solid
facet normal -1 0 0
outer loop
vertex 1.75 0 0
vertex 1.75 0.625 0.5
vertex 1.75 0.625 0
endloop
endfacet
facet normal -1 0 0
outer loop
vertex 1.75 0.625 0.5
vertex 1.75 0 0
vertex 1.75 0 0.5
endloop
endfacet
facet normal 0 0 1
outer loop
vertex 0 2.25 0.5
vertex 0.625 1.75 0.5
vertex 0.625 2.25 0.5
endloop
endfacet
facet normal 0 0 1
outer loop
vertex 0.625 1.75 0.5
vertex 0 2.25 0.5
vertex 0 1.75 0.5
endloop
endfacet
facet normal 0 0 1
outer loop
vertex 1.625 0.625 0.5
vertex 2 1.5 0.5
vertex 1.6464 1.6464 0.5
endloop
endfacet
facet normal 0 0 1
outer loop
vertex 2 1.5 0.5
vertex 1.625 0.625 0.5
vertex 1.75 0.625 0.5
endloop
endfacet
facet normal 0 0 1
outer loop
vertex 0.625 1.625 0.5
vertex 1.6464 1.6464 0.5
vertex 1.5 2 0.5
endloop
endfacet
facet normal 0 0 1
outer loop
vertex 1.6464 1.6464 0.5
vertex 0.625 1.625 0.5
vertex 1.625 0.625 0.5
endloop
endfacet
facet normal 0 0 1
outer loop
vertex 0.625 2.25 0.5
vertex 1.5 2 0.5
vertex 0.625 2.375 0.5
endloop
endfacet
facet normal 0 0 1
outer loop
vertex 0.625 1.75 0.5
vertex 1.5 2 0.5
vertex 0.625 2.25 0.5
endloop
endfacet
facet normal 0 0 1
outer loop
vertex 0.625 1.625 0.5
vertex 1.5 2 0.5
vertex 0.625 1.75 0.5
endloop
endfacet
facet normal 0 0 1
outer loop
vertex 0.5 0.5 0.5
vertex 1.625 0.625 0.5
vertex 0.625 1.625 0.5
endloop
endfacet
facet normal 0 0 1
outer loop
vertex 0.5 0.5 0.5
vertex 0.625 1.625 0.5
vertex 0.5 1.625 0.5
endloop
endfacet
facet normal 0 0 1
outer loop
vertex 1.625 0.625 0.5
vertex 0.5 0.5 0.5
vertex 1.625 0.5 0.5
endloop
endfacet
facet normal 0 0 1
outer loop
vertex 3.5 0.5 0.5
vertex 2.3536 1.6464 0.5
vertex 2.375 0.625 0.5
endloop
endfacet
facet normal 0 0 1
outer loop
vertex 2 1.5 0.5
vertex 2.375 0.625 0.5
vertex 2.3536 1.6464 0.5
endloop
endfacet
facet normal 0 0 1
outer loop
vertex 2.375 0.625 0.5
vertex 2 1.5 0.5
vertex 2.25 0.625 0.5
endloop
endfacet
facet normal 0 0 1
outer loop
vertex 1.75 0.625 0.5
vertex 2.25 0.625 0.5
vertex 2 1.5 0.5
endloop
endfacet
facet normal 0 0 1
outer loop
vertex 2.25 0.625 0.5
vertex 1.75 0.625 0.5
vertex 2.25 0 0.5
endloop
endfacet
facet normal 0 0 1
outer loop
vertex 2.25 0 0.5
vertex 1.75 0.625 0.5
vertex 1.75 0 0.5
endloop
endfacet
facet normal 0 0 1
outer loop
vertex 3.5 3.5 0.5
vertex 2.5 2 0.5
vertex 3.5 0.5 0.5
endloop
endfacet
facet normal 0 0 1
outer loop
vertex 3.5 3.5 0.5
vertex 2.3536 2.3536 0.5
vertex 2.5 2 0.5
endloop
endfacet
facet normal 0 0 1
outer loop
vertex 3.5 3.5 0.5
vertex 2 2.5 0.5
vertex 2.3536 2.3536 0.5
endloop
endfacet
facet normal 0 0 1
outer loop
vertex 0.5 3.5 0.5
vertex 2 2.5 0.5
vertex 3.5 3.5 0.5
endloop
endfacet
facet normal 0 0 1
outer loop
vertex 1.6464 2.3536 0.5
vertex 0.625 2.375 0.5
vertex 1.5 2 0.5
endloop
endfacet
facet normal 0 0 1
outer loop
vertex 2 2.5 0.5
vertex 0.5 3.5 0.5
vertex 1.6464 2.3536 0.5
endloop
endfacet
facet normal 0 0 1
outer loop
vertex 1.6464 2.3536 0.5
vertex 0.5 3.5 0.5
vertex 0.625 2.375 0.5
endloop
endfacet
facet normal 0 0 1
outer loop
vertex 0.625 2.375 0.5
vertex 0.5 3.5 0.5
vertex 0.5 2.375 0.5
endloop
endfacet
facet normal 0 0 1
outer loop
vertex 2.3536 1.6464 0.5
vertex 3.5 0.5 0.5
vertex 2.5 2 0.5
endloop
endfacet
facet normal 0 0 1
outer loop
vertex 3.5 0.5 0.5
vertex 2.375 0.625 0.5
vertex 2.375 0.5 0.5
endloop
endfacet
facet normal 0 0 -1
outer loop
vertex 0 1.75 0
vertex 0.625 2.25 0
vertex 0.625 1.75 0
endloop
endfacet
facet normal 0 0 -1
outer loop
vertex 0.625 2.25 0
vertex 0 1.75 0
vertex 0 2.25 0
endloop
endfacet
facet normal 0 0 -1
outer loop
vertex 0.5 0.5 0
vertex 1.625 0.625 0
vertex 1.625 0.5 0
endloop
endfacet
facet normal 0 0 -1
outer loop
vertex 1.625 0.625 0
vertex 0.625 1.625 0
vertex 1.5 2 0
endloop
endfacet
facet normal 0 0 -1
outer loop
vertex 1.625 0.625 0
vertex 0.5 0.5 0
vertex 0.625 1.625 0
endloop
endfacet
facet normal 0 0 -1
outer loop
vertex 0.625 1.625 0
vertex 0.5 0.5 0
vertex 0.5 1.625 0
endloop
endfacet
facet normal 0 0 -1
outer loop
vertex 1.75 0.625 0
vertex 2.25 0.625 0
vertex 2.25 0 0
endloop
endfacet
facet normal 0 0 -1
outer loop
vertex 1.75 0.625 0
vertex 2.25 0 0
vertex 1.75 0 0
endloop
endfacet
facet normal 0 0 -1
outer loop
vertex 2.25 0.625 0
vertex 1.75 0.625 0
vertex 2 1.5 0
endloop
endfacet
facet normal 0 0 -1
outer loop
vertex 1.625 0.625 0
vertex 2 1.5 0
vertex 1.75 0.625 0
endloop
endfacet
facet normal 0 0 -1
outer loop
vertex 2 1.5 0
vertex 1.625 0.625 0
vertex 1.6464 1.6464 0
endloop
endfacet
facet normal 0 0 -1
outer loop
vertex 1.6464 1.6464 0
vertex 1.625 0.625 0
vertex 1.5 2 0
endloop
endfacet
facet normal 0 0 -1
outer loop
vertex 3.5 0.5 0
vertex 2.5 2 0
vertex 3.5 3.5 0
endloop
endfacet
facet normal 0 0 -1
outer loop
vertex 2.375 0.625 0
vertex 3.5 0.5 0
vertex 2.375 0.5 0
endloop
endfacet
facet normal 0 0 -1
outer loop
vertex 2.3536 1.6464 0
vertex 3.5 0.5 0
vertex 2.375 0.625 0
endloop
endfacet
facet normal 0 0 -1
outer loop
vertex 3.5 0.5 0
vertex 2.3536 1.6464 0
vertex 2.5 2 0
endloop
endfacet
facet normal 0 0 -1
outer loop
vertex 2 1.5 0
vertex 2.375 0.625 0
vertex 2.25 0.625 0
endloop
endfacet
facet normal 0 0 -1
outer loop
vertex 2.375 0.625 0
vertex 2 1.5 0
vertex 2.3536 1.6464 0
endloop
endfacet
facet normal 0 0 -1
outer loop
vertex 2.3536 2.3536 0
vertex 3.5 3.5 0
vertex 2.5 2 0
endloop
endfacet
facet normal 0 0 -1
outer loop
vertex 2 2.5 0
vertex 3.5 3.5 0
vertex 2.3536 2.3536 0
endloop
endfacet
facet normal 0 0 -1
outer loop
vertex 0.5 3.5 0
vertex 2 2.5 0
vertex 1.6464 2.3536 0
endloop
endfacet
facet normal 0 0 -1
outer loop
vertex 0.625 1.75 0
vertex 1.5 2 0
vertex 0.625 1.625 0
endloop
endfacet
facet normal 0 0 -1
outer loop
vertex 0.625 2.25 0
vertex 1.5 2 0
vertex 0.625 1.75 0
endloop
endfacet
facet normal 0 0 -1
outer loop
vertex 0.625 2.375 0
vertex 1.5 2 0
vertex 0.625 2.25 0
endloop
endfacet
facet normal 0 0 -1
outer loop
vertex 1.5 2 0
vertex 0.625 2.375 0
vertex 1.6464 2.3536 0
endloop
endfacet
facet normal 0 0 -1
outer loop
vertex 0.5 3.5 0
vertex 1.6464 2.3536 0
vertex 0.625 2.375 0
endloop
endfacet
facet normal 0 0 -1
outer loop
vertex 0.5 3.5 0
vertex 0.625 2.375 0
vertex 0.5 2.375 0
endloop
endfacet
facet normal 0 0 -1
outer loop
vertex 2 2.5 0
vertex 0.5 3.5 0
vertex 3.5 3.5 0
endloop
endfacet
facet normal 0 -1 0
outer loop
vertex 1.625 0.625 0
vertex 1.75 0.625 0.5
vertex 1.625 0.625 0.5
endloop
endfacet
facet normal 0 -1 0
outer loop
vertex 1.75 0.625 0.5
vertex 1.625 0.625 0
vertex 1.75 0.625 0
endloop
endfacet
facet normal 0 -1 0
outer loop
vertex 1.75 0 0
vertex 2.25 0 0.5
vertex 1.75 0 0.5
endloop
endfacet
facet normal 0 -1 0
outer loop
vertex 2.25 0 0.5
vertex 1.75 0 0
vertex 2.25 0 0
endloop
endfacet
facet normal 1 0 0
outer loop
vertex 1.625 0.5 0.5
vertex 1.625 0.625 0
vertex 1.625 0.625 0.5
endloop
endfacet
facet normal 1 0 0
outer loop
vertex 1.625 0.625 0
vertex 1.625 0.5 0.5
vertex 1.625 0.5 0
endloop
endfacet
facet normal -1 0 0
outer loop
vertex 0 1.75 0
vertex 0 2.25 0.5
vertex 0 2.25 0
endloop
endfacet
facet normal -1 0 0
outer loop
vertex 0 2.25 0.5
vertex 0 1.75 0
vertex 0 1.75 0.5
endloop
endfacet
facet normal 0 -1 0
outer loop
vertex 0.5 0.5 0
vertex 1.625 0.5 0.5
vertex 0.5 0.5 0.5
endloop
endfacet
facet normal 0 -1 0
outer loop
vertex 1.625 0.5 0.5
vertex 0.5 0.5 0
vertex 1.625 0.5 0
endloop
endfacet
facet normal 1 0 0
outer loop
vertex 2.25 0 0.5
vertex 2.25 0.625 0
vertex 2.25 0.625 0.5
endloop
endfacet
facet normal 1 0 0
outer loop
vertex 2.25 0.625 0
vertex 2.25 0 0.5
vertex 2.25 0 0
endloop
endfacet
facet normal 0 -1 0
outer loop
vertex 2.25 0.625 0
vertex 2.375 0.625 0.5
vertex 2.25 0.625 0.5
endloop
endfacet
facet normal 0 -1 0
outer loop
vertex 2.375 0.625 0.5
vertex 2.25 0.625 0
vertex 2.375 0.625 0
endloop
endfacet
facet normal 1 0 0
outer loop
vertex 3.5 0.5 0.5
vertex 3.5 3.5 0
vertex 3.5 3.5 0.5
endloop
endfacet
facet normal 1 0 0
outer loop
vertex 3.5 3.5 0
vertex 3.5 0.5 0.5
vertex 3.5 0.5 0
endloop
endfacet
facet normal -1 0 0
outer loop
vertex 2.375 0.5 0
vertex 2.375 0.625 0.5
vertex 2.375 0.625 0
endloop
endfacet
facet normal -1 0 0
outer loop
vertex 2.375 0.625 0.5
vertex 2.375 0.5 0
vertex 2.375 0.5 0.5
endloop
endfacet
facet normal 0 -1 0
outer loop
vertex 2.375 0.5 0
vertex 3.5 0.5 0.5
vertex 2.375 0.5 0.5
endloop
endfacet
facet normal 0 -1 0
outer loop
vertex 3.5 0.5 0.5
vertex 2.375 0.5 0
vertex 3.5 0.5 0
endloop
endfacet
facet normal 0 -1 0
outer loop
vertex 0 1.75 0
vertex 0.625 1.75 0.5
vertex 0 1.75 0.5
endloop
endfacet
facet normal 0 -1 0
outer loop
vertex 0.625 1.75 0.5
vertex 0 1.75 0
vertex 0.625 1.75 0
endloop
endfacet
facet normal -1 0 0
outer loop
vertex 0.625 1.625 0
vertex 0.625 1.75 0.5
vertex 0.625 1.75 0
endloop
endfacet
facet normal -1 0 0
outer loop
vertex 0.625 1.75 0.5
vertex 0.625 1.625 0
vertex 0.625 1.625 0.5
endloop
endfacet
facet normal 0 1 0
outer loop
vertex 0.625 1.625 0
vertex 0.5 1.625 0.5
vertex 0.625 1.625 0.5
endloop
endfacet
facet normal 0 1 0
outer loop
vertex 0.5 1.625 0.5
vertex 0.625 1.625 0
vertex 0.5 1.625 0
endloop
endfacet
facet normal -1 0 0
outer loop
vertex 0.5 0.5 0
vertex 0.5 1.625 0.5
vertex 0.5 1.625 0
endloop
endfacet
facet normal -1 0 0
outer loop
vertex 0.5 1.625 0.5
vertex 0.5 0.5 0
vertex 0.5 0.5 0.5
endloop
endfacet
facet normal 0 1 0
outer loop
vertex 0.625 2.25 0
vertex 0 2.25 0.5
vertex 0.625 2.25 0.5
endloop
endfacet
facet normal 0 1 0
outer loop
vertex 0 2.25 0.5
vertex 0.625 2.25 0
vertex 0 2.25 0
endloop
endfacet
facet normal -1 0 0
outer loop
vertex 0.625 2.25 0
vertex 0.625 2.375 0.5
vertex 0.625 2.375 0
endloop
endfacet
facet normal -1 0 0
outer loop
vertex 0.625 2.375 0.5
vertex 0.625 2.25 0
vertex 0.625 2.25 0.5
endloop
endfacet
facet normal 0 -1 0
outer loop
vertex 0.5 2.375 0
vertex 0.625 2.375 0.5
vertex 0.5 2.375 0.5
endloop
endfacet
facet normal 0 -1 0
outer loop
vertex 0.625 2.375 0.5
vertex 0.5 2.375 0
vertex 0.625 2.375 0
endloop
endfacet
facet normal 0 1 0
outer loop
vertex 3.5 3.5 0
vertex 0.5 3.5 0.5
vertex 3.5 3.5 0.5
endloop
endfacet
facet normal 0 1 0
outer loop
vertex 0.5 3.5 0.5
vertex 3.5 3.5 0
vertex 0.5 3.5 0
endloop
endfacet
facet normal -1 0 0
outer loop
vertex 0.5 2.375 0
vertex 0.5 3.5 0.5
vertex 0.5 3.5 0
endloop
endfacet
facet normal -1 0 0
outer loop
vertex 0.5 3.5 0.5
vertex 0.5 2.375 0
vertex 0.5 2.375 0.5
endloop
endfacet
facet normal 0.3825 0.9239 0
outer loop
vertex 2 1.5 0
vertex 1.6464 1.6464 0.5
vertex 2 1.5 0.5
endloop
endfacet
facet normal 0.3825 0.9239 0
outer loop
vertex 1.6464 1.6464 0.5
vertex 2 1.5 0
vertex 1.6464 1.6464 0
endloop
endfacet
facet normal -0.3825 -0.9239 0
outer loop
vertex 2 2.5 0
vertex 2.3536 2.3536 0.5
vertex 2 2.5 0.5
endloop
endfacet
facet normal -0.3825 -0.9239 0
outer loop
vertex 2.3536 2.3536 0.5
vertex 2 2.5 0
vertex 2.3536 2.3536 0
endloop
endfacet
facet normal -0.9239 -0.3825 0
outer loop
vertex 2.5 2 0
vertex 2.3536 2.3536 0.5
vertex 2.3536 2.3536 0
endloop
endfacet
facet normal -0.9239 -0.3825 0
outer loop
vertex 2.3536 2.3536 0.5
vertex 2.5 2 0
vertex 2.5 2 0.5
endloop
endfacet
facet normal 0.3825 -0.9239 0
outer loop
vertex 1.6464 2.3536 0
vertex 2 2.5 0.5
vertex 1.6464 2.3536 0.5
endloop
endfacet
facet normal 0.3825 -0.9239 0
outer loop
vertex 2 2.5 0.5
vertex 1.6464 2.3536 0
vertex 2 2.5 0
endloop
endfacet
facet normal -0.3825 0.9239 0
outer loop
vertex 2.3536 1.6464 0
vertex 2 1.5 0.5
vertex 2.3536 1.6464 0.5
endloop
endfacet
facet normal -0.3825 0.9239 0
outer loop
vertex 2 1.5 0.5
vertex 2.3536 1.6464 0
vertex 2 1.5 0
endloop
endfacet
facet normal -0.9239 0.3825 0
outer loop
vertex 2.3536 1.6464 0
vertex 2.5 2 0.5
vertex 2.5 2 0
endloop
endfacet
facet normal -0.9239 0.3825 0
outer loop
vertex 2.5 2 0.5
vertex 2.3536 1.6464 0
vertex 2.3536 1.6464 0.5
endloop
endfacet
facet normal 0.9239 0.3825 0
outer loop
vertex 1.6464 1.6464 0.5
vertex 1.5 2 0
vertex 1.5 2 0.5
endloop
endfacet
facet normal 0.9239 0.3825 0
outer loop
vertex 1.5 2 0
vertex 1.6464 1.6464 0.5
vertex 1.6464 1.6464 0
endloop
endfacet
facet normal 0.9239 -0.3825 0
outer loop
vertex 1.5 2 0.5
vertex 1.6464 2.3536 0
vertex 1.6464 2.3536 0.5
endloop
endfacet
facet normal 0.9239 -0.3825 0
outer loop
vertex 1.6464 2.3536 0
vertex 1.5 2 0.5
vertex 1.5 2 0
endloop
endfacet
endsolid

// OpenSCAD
// file: modus.scad
//Corner Joint - allows the sides of two parts to create inlayed corner. Aids with welding.
//need to verify module math is the same throughout all parts.

module cornerjoint(Z,L,H,EndGap,PadL,PadH,CJangle,CJcenter){
    //change so that H = Z of inlayed part (usually 0.5)
    //add center and angle in degrees option, orgin far side of cut out area

     if((CJangle==0)&&(CJcenter==0))
      {    
        translate([0,0,0])
        rotate([0,0,CJangle])
        difference(){
        cube([L,H+PadH,Z]);
        translate([EndGap,H,0])
        cube([PadL,PadH,Z]);
        translate([L-EndGap-PadL,H,0])
        cube([PadL,PadH,Z]);}
      }    
else if((CJangle==90)&&(CJcenter==0))
      {    
        translate([H+PadH,0,0])
        rotate([0,0,CJangle])
        difference(){
        cube([L,H+PadH,Z]);
        translate([EndGap,H,0])
        cube([PadL,PadH,Z]);
        translate([L-EndGap-PadL,H,0])
        cube([PadL,PadH,Z]);}
      }
else if((CJangle==180)&&(CJcenter==0))       
      {    
        translate([L,H+PadH,0])
        rotate([0,0,CJangle])
        difference(){
        cube([L,H+PadH,Z]);
        translate([EndGap,H,0])
        cube([PadL,PadH,Z]);
        translate([L-EndGap-PadL,H,0])
        cube([PadL,PadH,Z]);}
      }
else if((CJangle==270)&&(CJcenter==0))
      {    
        translate([0,L,0])
        rotate([0,0,CJangle])
        difference(){
        cube([L,H+PadH,Z]);
        translate([EndGap,H,0])
        cube([PadL,PadH,Z]);
        translate([L-EndGap-PadL,H,0])
        cube([PadL,PadH,Z]);}
      }  
      
//centered     
   
else if((CJangle==0)&&(CJcenter==1))
      {    
        translate([-L/2,0,0])
        rotate([0,0,CJangle])
        difference(){
        cube([L,H+PadH,Z]);
        translate([EndGap,H,0])
        cube([PadL,PadH,Z]);
        translate([L-EndGap-PadL,H,0])
        cube([PadL,PadH,Z]);}
      }  
else if((CJangle==90)&&(CJcenter==1))
      {    
        translate([0,-L/2,0])
        rotate([0,0,CJangle])
        difference(){
        cube([L,H+PadH,Z]);
        translate([EndGap,H,0])
        cube([PadL,PadH,Z]);
        translate([L-EndGap-PadL,H,0])
        cube([PadL,PadH,Z]);}
      }
else if((CJangle==180)&&(CJcenter==1))       
      {    
        translate([L/2,0,0])
        rotate([0,0,CJangle])
        difference(){
        cube([L,H+PadH,Z]);
        translate([EndGap,H,0])
        cube([PadL,PadH,Z]);
        translate([L-EndGap-PadL,H,0])
        cube([PadL,PadH,Z]);}
      }
else if((CJangle==270)&&(CJcenter==1))
      {    
        translate([0,L/2,0])
        rotate([0,0,CJangle])
        difference(){
        cube([L,H+PadH,Z]);
        translate([EndGap,H,0])
        cube([PadL,PadH,Z]);
        translate([L-EndGap-PadL,H,0])
        cube([PadL,PadH,Z]);}
      }
} //end cornerjoint module

//Tab Insert - used to cut a hole for an abutting part to insert into. Typically aids with welding the two parts.
module tabinsert(X,Y,Z,dGap,cGap,c1,c2,c3,c4,c5,c6,c7,c8,center){
    translate([-dGap-(center*(X/2)),-dGap-(center*(Y/2)),0]){
        //main cut
        cube([X+(dGap*2),Y+(dGap*2),Z]);
        //corner c1c2
        translate([-cGap,(Y+(dGap*2))-c1+cGap,0])
            {
        cube([c2,c1,Z]);}
       //corner c3c4
       translate([(X+(dGap*2))-c3+cGap,(Y+(dGap*2))-c4+cGap,0]){
           cube([c3,c4,Z]);
       }
       //corner c5c6
       translate([(X+(dGap*2))-c6+cGap,-cGap,0])
      {
          cube([c6,c5,Z]);
      }
       
       //corner c7c8 
       translate([-cGap,-cGap,0]){
           cube([c7,c8,Z]);
       }
    
    } //end center translate
} //end tabinsert module
 

module nut(flattoflat,nutheight){  //distance from one flat side to the other flat side "A/F"

//typical sizes found here:
//https://en.wikipedia.org/wiki/Nut_(hardware)

difference(){
    translate([0,0,nutheight/2])
cube(size = [10,10,nutheight], center = true);
    
for(i=[1:6]){
    rotate([0,0,i*60])
difference(){
    translate([-10,0,0])
    cube([20,20,nutheight]);
    translate([-10,0,0])
    cube([20,flattoflat/2,nutheight]);
}  //end difference
}  //end for
}  //end differeence
}  //end module
// file: vars.scad
brickW=6; 
brickL=24;
brickCH=6; //Is brick height being shortened by d1z??

//3.625 x 2.25 x 8
//6 x 12 x 6

grateX=56;
grateY=23;
grateH=37; //Height mounted above press's frame
grateA=17.5; //angle of grate

//grateX=56;
//grateY=23;
//grateH=37; //Height mounted above press's frame
//grateA=17.5; //angle of grate


$fn=8; //defines resolution of circles. 8 is okay for review. 100  or greater should be used for for final dxf export.

dZstandard=0.5; //thickness of steel to be cut for drawer parts
fZstandard=0.5;
aZstandard=0.5; //thickness of steel to be cut for arm parts
hZstandard=0.125;

fBOLTHOLEstandardD=1; //standard bolts used on frame
aBOLTHOLEstandardD=1;

sliderodholeOD=1.2; 
d1bushingOD=1.25;
d1bushingL=1.25;
d1shaftOD=1;
d1bolt1OD=1;
d1bolt2OD=0.75;
d1nut2AF=1.25;
d1nut2H=0.665;


dGap=0.03125; //gap between a hole cut's edge and the part sitting within the hole. //D3 appears to use 0.3125, is this in error?

//all parts set to standard thickness below
//off standard preferences can be defined below

//drawer
drawergap=0.0283;  //extra room for drawer to slide in the space between f1 and f4
drawerHgap=0.1884;  //total extra space from drawer sides to frame walls. sum of both sides.

d2clevispinaccessholeOD=3;

d1z=dZstandard;
d2z=dZstandard;
d3z=dZstandard;
d4z=dZstandard;
d5z=dZstandard;
d6z=dZstandard;
d5z=dZstandard;
d7z=dZstandard;
d8z=dZstandard;
d9z=dZstandard;

d11z=dZstandard;
d12z=dZstandard;


//frame

f1y=6;
f1z=fZstandard;


f2y=3.5;
f2z=fZstandard;

f3y=3.5;
f3z=fZstandard;

f4y=11;
f4z=fZstandard;

f5y=3.5;
f5z=fZstandard;

f6y=8;
f6z=fZstandard;

f8y=brickW;
f8z=fZstandard;
f8boltD=1;

f9y=4.5;

f9z=fZstandard;




f12z=fZstandard;   

f11x=1.25;
f11z=fZstandard;

f13z=fZstandard;

f14y=3.5;
f14z=fZstandard;

//arms

a1x=4;
a1z=aZstandard;
a1out=24; //length from frame to A5 edge for bricks to sit on as they exit

a2x=6;
a2z=aZstandard;

a3x=4;
a3y=72;
a3z=aZstandard;

a4x=6;
a4y=72;
a4z=aZstandard;

a5x=6;
a5y=72;
a5z=aZstandard;

a6z=aZstandard;

//guards

h1x=grateX;
h1y=grateH;  //might need to tweak for grate thickness

h1z=hZstandard;
h2z=hZstandard;
h3z=hZstandard;
h4z=hZstandard;
h5z=hZstandard;
h6z=hZstandard;
h7z=hZstandard;
h8z=hZstandard;

//
//Input your main cylinder's dimenions here
//
cylMainBore = 5;
cylMainStroke = 16;
cylMainExt = 43;
cylMainRet = 27;
cylMainA = (cylMainRet-cylMainStroke); //center to center minus stroke length
cylMainB = 0.25; // cylinder wall thickness
cylMainD = 2.5; //Rod OD
cylMainE = 5.75; //rear pin holder width
cylMainG = 4; //rod pin holder width
cylMainJ = 3.8; //distance from the end of the cylinder body to rod pin center
cylMainR = 1.52; //pin hole ID
cylMainS = 2.5; //pin holder OD

//
//Input your drawer cylinder's dimenions here
//
//
cylDrawerBore = 5;
cylDrawerStroke = 16;
cylDrawerExt = 43;
cylDrawerRet = 27;
cylDrawerA = (cylMainRet-cylMainStroke); //center to center minus stroke length
cylDrawerB = 0.25; // cylinder wall thickness
cylDrawerD = 2.5; //Rod OD
cylDrawerE = 5.75; //rear pin holder width
cylDrawerG = 4; //rod pin holder width
cylDrawerJ = 3.8; //distance from the end of the cylinder body to rod pin center
cylDrawerR = 1.52; //pin hole ID
cylDrawerS = 2.5; //pin holder OD

cylinderDRAWERbodyH=3; //measured when in position, largest length from top to bottom of cylinder
cylinderDRAWERminC2C=0; //drawer's hydraulic cylinder's distance from the center of one mounting hole to the center of the other when fully compressed.
cylinderDRAWERmaxC2C=0; ///drawer's hydraulic cylinder's distance from the center of one mounting hole to the center of the other when fully extended.
cylinderDRAWERrodclevisW=2.5; //width of cylinders' clevis on end of rod
cylinderDRAWERrodclevisID=1;
cylinderDRAWERrodclevisOD=2;
cylinderDRAWERrearclevisW=2.5; //width of mounting clevis cylinder body
cylinderDRAWERrearclevisID=1;
cylinderDRAWERrearclevisOD=2;
cylinderDRAWERrearclevisClearance=3; //usable space around rear clevis pin (in diameter). be aware of hyraulic fittings.

//the following variables are calculated in order of dependence on preceding variables

d3x=brickL+(d2z*2);
d3y=brickCH-d1z;
d4x=brickW+d3z+d3z;
d4y=brickCH-d1z;
d5x=brickL+(d2z*2);
d5y=brickW;
d6x=brickL+(d2z*2);
d6y=brickCH;
d7x=cylinderDRAWERrearclevisClearance;
d7y=a4z+d8z+cylinderDRAWERbodyH;
d9x=cylinderDRAWERbodyH+d6z; //should be based on clevis size?
d9y=cylinderDRAWERbodyH+d8z;
d8x=brickL+(d2z*2);
d8y=max(5,(d9x-d6z));   //need to review fundamentals, 5 minimun unless d9 gets larger than d8
d11x=1.5+(d1bolt1OD*2)+d1bushingOD;
d11y=max((0.5+d1bushingL),4);

d12x=d8x;
d12y=d11y+1;

f1x=((brickL+(d2z*2)+drawerHgap+(f9y*2)));
f3x=f1x;

d1x=(brickL+d2z+d2z);
//d1x=(((f1x/2)-(((brickL+(d2z*2)+drawerHgap)/2)-fZstandard-(sliderodholeOD/2)))+(d11x/2))*2;
d1y=((brickW+d3z+d3z)*3)+1;

d2x=d8y+d6z+brickW+d3z+d5y+d3z;
d2y=brickCH;



f11y=f8y;
f6x=brickL+(d2z*2)+(f9y*2)+drawerHgap;

f9x=(f2z+((cylMainS+0.125)/2)+cylMainRet-cylMainJ+1+f4y+drawergap+d2y+f1y);  //leaves 1" between top of cylinder and bottom of F4
f8x=f9x;


f2x=brickL+(d2z*2)+drawerHgap+(f9y*2)-(1.4*2);  //distance between large cut outs in f9

f5x=brickL+(d2z*2)+drawerHgap+(f9y*2)+(a1x*2); //distance between outer edges of each A1

f4x=f5x-0.5;   //same as f5 but minus 0.25 on each side to give a little overhang

f14x=brickL+(1*2)+(.125*2)+(dGap*2); 

f12x=f3x;
f12y=(f3y*2)+brickW;

sliderodoffset=(((brickL+(d2z*2)+drawerHgap)/2)-fZstandard-(sliderodholeOD/2));

distancetof8center=(cylDrawerExt+(a4x/2)+((d9x-d6z)/2)+d6z+(brickW/2)); //F8 center on A1

a1y=distancetof8center+(brickW/2)+a1out;
a2y=a1y;

h7x=f5x-((a1x/2)*2)+(1.5*2);
h7y=cylDrawerStroke;

h8x=f5x-((a1x/2)*2)+(1.5*2);
h8y=a1out-a5x-f5y;  //distance between a5 and f5

hopperBaseX=brickL;
hopperBaseY=brickW;

h2x=grateX;
h2y=sqrt(((h1y-(sin(grateA)*grateY))*(h1y-(sin(grateA)*grateY)))+(((cos(grateA)*grateY)-hopperBaseY)*((cos(grateA)*grateY)-hopperBaseY)));

//h1y-(sin(grateA)*grateY)
//(cos(grateA)*grateY)-hopperBaseY

echo(h1y-(sin(grateA)*grateY));
echo((cos(grateA)*grateY)-hopperBaseY);
echo(h2y);
echo(atan((h1y-(sin(grateA)*grateY))/((cos(grateA)*grateY)-hopperBaseY)));
echo((h1y-(sin(grateA)*grateY))/(h1y));

// ECHO - REQUIRED PARTS BASED ON INPUTS

echo(str("Minimum drawer cylinder stroke length: ",(d3z*2)+d5y+brickW));
//would be cool to validate and confirm user inputed stroke length. set error=1; if drawer cylinder is not long enough. print an echo warning.

echo(str("Grate hieght above ground level: ",(1)));
// main file
include <vars.scad>;
use <modus.scad>;

d9p();

module d9p(){

difference(){
cube([d9x,d9y,d9z]);
    
    //x
translate([-0.125,0,0])
    cornerjoint(d9z,0.125+(d6z+((d9x-d6z-0.5)/2)),d8z,0.125,(d6z+((d9x-d6z-0.5)/2))-0.125,0.125,0,0);
translate([0.5+(d6z+((d9x-d6z-0.5)/2)),0,0])
    cornerjoint(d9z,((d9x-d6z-0.5)/2)+0.125,d8z,0.125,((d9x-d6z-0.5)/2)-0.125,0.125,0,0);
    
    //y
translate([0,-0.125,0])
    cornerjoint(d9z,0.125+(d8z+((d9y-d8z-0.5)/2)),d6z,0.125,(d8z+((d9y-d8z-0.5)/2))-0.125,0.125,270,0);
translate([0,0.5+(d8z+((d9y-d8z-0.5)/2)),0])
    cornerjoint(d9z,((d9y-d8z-0.5)/2)+0.125,d6z,0.125,((d9y-d8z-0.5)/2)-0.125,0.125,270,0);

    //pin hole
translate([(0.5/2)+(d6z+((d9x-d6z-0.5)/2)),(0.5/2)+(d8z+((d9y-d8z-0.5)/2)),0])
    cylinder(h = d9z,r = (cylinderDRAWERrodclevisID/2));
}

} //end d9p module
